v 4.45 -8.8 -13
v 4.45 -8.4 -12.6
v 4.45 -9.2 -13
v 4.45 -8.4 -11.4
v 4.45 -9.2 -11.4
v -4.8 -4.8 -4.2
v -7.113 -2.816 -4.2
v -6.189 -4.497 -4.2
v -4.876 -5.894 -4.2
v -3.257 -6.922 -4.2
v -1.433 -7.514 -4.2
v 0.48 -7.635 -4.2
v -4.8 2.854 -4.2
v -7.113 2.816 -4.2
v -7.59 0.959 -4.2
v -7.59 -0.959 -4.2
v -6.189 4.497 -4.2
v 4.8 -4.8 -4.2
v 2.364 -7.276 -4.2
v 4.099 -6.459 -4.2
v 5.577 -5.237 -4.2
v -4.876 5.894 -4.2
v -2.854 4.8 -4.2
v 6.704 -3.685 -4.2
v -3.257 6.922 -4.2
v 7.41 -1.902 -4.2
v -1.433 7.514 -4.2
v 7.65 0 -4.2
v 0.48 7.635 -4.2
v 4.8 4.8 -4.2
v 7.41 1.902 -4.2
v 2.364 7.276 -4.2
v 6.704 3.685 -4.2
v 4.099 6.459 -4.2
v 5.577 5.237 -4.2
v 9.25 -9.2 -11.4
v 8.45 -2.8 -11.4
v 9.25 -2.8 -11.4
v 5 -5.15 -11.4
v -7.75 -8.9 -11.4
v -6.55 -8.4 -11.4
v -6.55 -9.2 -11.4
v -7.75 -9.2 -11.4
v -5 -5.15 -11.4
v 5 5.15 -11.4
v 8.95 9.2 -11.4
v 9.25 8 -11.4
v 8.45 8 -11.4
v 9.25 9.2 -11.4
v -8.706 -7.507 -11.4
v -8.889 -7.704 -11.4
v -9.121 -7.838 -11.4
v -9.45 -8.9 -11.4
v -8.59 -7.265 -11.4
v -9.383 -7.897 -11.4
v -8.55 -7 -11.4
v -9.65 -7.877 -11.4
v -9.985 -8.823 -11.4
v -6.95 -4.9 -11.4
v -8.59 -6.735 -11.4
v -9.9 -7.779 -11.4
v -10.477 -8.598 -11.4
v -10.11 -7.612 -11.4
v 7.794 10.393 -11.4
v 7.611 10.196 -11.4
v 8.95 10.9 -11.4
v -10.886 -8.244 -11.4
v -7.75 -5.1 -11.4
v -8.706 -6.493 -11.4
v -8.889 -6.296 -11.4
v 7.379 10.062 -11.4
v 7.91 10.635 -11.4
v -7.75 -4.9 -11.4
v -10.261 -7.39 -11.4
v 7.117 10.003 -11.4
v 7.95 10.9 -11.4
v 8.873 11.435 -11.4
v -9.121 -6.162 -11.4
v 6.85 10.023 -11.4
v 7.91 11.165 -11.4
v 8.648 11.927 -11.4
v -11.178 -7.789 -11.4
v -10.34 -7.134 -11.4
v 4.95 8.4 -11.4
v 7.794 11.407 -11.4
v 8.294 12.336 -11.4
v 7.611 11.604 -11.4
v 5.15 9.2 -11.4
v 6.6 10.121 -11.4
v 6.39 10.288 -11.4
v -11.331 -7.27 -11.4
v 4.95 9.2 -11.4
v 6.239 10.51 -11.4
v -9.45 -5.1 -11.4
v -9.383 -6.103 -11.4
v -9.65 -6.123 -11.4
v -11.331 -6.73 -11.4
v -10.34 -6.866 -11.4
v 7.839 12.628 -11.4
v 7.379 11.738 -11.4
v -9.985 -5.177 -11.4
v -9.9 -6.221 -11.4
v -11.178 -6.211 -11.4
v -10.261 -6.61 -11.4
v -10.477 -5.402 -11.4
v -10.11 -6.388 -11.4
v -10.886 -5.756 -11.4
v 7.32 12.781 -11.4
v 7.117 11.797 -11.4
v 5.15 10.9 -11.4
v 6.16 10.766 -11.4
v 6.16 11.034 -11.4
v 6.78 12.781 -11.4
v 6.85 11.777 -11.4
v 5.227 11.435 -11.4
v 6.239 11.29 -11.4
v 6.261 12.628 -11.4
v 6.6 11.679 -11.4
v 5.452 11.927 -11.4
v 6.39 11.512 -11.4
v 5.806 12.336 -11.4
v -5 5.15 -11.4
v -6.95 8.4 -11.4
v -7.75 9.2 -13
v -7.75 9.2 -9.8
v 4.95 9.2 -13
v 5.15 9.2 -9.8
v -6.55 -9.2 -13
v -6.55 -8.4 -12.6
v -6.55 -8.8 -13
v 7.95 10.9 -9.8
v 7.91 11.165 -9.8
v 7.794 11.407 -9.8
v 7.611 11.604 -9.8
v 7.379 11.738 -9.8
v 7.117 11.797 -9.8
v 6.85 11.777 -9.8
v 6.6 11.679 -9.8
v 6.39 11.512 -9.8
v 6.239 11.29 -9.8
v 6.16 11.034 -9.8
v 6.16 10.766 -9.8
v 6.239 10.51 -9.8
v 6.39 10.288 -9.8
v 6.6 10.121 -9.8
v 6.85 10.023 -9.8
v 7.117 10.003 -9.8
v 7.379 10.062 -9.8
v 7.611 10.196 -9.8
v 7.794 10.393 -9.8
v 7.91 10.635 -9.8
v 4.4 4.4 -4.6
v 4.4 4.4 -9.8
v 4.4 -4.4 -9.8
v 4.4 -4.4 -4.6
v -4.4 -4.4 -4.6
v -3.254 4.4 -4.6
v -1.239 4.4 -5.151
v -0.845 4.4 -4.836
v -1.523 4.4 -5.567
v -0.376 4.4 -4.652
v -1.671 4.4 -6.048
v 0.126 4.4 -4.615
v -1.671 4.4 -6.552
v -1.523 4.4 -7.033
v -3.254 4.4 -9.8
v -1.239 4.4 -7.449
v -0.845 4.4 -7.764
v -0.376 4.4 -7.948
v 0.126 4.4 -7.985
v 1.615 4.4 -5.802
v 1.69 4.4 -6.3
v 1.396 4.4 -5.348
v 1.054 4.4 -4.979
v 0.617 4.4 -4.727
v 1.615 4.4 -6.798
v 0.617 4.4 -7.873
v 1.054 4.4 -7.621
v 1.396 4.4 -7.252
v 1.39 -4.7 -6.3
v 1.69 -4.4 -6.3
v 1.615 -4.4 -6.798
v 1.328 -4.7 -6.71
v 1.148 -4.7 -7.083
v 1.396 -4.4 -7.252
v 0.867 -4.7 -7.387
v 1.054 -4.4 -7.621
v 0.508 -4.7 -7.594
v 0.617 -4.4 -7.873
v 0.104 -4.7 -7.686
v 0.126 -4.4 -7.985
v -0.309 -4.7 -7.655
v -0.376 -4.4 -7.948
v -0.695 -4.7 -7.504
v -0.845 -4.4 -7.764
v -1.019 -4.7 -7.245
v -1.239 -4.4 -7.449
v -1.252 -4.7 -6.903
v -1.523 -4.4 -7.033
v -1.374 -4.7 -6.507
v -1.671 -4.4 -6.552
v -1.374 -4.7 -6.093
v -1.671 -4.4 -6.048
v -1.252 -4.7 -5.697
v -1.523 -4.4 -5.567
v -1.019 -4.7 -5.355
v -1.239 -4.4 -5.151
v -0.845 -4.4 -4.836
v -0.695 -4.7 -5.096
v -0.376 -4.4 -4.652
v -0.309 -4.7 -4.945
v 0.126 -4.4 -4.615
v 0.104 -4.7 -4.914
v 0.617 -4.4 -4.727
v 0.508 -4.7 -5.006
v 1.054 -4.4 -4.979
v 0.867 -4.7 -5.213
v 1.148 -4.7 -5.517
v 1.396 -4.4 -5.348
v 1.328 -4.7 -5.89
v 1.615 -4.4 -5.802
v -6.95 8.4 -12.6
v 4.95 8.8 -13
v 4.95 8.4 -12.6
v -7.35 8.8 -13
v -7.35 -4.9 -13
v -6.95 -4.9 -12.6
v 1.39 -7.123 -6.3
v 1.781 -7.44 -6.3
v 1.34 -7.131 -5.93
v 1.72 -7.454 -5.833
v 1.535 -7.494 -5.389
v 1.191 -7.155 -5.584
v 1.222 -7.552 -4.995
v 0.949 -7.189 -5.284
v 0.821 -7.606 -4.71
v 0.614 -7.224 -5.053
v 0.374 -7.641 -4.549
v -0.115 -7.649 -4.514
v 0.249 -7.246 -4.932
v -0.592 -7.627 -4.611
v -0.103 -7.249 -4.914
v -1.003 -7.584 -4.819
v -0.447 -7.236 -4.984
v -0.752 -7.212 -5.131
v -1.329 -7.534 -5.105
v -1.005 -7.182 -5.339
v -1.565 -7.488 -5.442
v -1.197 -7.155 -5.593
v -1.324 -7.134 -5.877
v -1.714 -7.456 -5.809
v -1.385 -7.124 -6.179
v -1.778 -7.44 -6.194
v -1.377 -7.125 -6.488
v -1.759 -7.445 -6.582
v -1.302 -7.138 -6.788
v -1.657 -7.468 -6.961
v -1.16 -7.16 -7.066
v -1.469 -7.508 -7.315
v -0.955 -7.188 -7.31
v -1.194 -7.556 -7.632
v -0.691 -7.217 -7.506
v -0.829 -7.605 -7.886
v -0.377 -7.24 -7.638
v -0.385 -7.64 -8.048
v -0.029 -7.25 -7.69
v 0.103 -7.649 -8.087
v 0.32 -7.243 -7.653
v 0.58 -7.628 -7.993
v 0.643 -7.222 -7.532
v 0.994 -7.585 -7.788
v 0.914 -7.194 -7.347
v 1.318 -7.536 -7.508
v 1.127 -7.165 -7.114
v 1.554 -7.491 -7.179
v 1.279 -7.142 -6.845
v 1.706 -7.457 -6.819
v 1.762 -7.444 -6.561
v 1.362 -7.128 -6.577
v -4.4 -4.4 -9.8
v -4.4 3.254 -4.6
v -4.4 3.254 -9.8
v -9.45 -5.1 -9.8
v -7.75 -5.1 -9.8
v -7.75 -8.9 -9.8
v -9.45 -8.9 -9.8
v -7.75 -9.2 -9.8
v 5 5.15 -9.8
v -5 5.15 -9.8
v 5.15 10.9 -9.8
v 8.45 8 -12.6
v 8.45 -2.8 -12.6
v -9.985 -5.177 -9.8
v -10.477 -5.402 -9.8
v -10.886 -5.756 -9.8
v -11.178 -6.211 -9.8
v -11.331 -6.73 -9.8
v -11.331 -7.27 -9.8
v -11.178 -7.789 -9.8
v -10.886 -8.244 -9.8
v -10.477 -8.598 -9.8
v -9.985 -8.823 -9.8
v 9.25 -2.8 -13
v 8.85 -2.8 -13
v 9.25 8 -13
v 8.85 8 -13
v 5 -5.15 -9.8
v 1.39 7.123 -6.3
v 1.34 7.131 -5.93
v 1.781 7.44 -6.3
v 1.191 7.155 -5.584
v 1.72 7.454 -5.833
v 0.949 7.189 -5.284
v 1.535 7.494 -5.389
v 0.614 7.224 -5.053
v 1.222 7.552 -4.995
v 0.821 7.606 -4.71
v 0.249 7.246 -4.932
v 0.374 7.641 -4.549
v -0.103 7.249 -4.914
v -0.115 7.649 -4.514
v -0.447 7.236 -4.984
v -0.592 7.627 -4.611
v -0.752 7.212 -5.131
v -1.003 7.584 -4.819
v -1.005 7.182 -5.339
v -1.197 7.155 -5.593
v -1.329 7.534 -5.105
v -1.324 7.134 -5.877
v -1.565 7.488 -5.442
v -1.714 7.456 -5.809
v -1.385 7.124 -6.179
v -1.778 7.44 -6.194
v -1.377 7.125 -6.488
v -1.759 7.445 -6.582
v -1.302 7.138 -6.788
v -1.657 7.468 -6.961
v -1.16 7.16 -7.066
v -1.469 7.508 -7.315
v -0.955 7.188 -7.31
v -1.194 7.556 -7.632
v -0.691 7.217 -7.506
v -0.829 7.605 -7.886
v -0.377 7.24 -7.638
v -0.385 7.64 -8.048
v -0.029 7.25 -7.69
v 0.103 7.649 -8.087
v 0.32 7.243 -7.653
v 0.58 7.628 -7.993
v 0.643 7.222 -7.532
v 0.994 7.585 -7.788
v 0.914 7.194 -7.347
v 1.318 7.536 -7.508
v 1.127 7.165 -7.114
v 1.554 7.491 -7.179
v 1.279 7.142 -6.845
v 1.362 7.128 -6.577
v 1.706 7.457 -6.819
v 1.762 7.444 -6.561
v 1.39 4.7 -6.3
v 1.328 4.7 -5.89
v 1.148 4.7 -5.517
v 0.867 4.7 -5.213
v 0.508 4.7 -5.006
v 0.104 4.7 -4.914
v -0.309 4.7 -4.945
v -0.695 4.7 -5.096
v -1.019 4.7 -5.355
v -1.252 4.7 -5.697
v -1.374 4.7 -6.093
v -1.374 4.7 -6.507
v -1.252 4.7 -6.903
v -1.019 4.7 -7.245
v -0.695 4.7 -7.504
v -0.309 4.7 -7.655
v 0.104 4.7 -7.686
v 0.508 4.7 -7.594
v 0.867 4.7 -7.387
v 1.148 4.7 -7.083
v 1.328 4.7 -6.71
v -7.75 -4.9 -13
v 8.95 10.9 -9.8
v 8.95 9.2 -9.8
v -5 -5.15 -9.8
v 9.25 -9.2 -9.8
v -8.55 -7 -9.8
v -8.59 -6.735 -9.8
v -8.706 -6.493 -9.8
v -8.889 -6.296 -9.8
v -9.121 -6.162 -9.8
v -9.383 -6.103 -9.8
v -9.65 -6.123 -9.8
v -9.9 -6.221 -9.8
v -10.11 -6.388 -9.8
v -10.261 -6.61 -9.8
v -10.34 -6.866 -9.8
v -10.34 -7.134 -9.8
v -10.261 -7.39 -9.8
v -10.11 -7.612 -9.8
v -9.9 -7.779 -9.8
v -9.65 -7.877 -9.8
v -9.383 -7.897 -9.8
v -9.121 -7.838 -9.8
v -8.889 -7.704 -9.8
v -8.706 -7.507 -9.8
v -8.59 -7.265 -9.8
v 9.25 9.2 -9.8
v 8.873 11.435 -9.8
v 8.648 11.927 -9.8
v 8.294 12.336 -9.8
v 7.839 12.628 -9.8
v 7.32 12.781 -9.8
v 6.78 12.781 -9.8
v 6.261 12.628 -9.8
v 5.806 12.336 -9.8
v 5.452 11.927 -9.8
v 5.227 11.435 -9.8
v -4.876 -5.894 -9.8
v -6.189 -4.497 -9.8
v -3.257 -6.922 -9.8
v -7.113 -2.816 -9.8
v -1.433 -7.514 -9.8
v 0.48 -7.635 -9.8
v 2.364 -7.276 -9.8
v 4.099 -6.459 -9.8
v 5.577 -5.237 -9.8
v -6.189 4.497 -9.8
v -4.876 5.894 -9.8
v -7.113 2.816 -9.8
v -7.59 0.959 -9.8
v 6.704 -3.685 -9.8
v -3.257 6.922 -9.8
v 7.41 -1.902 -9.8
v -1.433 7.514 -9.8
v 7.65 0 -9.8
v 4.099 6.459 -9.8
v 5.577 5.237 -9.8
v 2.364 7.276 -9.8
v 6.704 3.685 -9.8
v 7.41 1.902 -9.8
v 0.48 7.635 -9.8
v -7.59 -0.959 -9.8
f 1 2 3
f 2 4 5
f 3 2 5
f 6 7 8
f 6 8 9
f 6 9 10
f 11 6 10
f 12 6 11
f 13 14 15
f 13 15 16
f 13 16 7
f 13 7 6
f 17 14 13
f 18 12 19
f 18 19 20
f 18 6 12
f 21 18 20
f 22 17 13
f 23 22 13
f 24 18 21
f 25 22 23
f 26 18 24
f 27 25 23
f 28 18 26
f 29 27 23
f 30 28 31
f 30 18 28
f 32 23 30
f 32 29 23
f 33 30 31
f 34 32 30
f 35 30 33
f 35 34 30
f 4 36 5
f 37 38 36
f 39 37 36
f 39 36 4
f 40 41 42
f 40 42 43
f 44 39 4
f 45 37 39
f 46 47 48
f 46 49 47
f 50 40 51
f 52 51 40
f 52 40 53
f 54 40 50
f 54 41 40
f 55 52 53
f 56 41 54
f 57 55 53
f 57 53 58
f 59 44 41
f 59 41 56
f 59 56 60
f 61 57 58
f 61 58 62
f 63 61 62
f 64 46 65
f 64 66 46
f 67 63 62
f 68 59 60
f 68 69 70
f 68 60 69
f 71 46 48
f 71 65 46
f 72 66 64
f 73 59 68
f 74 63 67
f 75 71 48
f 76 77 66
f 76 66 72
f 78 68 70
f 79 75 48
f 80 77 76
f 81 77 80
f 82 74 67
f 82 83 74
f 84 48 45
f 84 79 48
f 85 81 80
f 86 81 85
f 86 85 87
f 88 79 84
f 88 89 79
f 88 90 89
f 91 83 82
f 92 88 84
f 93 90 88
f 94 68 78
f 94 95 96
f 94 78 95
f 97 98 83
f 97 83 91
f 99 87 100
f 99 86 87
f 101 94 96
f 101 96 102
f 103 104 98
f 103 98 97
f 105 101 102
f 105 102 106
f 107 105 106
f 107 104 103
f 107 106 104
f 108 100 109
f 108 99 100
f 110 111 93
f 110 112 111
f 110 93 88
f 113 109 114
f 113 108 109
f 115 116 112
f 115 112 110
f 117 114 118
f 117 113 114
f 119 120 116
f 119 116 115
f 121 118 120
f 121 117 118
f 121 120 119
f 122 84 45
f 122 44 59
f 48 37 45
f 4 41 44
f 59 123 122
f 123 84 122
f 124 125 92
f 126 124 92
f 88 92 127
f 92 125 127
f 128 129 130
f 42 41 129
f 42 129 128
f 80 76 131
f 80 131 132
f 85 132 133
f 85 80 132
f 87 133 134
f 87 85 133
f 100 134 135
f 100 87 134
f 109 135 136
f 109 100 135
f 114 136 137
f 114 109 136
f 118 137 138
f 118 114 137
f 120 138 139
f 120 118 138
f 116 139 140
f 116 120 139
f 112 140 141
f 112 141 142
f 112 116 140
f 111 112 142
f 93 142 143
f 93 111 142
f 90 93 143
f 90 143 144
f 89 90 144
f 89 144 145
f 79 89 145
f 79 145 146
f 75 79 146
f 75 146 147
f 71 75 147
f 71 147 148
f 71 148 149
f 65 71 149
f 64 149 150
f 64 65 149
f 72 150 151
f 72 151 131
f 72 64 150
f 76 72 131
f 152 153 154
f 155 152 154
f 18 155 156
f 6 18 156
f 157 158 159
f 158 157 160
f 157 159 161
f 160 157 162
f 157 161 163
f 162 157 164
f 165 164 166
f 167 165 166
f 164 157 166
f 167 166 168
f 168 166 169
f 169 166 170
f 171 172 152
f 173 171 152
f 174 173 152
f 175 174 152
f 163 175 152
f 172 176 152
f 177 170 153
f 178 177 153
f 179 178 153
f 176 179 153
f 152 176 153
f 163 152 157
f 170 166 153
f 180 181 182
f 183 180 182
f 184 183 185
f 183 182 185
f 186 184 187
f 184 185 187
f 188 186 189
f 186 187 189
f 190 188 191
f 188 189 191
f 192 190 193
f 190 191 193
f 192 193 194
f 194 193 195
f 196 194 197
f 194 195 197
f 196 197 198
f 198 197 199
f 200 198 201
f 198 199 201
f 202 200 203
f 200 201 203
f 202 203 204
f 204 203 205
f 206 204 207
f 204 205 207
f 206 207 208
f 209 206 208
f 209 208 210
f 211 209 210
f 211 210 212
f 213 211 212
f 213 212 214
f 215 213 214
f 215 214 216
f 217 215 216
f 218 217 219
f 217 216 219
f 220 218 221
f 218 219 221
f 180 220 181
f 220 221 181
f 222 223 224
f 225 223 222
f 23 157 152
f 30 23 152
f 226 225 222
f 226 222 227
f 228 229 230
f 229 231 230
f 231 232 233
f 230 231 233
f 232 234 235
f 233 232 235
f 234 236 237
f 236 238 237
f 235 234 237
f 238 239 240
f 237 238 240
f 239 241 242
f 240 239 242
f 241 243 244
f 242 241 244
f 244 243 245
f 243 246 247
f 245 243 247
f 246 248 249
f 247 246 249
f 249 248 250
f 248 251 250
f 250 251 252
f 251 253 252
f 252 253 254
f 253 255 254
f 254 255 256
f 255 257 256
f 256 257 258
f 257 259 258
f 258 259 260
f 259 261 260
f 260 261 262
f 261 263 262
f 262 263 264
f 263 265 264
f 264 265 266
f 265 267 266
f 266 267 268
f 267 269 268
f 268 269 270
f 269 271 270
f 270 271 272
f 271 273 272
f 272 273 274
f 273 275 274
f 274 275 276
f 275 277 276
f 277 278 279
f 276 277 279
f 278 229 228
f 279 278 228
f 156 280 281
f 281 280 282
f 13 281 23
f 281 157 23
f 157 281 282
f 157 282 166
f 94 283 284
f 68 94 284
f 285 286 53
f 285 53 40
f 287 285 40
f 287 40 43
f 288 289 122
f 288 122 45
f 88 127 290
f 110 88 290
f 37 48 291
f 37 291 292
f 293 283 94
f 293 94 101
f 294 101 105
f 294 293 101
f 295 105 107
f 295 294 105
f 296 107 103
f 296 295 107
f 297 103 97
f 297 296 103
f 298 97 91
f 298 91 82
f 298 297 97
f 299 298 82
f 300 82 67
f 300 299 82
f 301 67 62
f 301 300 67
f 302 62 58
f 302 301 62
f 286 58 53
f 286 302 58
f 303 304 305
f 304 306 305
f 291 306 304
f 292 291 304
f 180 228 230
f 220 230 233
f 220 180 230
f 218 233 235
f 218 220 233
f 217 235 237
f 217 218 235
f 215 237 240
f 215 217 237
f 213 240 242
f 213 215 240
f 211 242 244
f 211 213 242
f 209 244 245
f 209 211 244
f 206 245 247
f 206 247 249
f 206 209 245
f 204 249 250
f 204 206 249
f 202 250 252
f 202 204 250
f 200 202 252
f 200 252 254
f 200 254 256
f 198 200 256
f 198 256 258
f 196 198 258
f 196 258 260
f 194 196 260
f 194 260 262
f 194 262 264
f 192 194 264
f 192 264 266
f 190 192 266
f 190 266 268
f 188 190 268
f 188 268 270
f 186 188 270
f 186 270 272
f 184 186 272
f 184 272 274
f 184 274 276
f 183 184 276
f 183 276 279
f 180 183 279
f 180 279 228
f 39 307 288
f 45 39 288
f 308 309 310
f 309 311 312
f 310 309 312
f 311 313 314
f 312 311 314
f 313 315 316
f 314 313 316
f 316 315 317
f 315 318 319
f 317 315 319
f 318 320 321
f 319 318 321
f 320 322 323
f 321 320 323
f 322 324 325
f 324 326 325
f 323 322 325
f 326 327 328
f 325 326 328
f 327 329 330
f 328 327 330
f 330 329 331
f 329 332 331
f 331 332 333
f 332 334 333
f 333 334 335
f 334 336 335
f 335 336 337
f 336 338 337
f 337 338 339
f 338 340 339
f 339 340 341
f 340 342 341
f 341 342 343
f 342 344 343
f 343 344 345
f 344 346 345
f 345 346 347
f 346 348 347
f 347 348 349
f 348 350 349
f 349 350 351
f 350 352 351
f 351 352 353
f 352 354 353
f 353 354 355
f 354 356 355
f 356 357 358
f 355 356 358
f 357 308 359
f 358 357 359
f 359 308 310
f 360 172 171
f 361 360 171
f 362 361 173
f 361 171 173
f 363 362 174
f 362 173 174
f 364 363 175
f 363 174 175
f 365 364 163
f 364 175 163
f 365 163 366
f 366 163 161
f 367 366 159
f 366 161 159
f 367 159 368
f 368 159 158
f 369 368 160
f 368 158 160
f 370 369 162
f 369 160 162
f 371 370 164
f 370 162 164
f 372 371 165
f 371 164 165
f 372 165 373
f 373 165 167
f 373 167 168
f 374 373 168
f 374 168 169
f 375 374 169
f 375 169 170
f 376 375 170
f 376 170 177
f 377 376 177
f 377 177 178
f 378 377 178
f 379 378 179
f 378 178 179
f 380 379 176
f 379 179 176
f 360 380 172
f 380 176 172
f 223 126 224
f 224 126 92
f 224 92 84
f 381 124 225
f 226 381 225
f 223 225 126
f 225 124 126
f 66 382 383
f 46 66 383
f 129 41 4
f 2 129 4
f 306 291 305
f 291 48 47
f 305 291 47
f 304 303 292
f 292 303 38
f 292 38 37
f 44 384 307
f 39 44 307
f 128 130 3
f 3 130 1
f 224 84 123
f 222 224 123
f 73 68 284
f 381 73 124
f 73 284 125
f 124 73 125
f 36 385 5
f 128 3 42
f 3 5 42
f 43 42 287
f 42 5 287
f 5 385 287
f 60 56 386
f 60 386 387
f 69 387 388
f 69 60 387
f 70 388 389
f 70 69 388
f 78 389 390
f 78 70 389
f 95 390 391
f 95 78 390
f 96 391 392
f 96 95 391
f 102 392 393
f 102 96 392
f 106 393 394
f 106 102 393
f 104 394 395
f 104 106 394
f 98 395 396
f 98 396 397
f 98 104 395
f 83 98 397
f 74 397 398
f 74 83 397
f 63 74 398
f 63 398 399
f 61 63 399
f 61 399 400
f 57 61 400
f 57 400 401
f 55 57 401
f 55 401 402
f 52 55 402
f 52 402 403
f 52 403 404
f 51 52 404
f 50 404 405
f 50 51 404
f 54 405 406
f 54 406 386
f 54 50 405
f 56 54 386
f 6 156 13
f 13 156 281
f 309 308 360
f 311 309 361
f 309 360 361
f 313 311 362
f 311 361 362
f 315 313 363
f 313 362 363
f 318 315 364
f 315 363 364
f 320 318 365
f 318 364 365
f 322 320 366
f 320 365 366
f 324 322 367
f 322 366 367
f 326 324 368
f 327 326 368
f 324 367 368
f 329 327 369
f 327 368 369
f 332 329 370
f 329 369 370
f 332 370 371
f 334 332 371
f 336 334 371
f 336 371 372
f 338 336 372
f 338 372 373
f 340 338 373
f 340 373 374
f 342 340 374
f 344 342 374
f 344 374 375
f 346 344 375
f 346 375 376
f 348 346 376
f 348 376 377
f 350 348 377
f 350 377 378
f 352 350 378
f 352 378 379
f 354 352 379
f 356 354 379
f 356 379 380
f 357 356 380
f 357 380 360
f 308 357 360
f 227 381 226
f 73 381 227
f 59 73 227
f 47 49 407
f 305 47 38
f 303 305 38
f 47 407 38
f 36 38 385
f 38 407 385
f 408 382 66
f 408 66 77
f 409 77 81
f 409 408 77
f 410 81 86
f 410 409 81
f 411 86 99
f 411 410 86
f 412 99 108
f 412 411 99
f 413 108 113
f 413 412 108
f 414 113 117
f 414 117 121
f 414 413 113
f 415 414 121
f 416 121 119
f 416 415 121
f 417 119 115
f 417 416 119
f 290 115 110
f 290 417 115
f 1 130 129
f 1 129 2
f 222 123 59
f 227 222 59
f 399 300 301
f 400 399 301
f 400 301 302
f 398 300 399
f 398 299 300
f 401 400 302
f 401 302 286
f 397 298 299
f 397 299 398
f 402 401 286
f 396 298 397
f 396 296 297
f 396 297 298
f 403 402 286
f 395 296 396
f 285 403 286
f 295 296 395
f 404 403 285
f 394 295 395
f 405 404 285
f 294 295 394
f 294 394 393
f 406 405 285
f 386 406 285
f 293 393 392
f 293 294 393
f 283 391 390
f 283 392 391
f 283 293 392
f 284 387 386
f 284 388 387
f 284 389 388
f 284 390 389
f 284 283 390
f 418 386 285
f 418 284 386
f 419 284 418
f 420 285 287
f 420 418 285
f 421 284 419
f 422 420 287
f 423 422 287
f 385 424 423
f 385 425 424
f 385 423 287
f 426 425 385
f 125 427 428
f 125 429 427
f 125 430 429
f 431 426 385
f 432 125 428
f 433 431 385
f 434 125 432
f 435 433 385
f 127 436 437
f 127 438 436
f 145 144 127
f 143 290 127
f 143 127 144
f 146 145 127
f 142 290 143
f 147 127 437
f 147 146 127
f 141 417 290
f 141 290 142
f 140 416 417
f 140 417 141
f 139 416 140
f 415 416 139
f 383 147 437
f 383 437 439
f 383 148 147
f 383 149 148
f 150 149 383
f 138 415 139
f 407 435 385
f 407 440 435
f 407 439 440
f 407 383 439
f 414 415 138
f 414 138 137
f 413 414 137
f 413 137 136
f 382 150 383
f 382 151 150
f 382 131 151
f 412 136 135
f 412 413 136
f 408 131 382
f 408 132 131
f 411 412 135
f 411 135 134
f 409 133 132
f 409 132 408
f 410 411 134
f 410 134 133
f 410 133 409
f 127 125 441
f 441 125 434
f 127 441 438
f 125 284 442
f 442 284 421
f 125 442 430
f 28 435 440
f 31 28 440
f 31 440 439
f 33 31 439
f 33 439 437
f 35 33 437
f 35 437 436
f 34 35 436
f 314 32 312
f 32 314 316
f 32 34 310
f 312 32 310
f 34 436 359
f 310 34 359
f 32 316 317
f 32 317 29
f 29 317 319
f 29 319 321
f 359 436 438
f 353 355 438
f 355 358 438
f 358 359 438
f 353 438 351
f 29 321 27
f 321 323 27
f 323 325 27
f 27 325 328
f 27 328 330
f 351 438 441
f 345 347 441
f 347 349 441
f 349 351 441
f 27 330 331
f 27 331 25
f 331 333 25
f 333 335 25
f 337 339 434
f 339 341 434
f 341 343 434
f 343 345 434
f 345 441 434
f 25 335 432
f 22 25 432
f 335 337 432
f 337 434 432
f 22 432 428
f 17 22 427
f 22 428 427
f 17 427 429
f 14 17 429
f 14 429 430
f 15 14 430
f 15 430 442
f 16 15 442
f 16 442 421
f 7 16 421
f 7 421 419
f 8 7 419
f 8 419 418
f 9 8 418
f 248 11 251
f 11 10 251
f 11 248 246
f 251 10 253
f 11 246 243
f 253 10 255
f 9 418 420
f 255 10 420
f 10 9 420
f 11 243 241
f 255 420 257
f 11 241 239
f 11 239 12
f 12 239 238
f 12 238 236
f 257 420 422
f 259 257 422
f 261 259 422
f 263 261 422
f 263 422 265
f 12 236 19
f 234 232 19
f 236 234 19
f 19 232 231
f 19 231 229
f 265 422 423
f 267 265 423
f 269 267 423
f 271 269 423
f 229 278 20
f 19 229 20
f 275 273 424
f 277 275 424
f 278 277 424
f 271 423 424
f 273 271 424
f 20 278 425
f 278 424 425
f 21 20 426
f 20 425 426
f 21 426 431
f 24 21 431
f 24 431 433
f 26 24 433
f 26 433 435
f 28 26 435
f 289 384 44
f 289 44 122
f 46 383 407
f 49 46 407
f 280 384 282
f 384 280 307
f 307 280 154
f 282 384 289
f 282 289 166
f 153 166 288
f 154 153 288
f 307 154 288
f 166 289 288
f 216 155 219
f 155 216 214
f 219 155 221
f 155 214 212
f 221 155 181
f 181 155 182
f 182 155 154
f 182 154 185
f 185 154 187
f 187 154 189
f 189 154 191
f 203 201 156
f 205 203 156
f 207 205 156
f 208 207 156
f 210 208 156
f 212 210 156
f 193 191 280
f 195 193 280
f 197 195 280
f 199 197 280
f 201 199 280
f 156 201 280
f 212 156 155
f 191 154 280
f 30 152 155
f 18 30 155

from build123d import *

# Parameters (mm, degrees)
SKETCH004_R          = 0.9
PAD_DEPTH            = 1.6
SKETCH007_W          = 10
SKETCH007_H          = 10.3
POCKET001_DEPTH      = 1.601
POCKET001_DEPTH_BACK = 1.601
POCKET_DEPTH         = 1.6
CHAMFER001_SIZE      = 0.4
SKETCH008_R          = 7.65
PAD001_DEPTH         = 5.6
CHAMFER_SIZE         = 0.4
SKETCH029_R          = 1.39
POCKET016_DEPTH      = 12.801
POCKET016_DEPTH_BACK = 9.201
CHAMFER002_SIZE      = 0.4
CHAMFER003_SIZE      = 0.3
CHAMFER004_SIZE      = 0.3
CHAMFER005_SIZE      = 0.4


with BuildPart() as part:
    # Sketch004 → Pad (new body, symmetric)
    with BuildSketch(Plane.XY.offset(-11.4)):
        with BuildLine():
            ThreePointArc((8.95, 10.9), (7.05, 12.8), (5.15, 10.9))
            Line((5.15, 9.2), (5.15, 10.9))
            Line((-7.75, 9.2), (5.15, 9.2))
            Line((-7.75, -5.1), (-7.75, 9.2))
            Line((-9.45, -5.1), (-7.75, -5.1))
            ThreePointArc((-9.45, -5.1), (-11.35, -7), (-9.45, -8.9))
            Line((-9.45, -8.9), (-7.75, -8.9))
            Line((-7.75, -8.9), (-7.75, -9.2))
            Line((9.25, -9.2), (-7.75, -9.2))
            Line((9.25, 9.2), (9.25, -9.2))
            Line((8.95, 9.2), (9.25, 9.2))
            Line((8.95, 10.9), (8.95, 9.2))
        make_face()
        with Locations((-9.45, -7)):
            Circle(SKETCH004_R, mode=Mode.SUBTRACT)
        with Locations((7.05, 10.9)):
            Circle(SKETCH004_R, mode=Mode.SUBTRACT)
    extrude(amount=PAD_DEPTH, both=True)

    # Sketch007 → Pocket001 (cut, two sides)
    with BuildSketch(Plane.XY.offset(-11.4)) as pocket001_sk:
        Rectangle(SKETCH007_W, SKETCH007_H)
    extrude(amount=-POCKET001_DEPTH, mode=Mode.SUBTRACT)
    extrude(pocket001_sk.sketch, amount=POCKET001_DEPTH_BACK, mode=Mode.SUBTRACT)

    # Sketch006 → Pocket (cut)
    with BuildSketch(Plane.XY.offset(-11.4)):
        with BuildLine():
            Line((8.45, 8), (8.45, -2.8))
            Line((11.05, -2.8), (8.45, -2.8))
            Line((11.05, -11), (11.05, -2.8))
            Line((4.45, -11), (11.05, -11))
            Line((4.45, -8.4), (4.45, -11))
            Line((-6.55, -8.4), (4.45, -8.4))
            Line((-6.55, -8.4), (-6.55, -8.9))
            Line((-6.55, -8.9), (-6.55, -9.2))
            Line((-6.55, -9.2), (-7.75, -9.2))
            Line((-7.75, -9.2), (-7.75, -8.9))
            Line((-9.65, -8.9), (-7.75, -8.9))
            ThreePointArc((-9.65, -5.1), (-11.55, -7), (-9.65, -8.9))
            Line((-9.65, -5.1), (-7.75, -5.1))
            Line((-7.75, -4.9), (-7.75, -5.1))
            Line((-7.75, -4.9), (-6.95, -4.9))
            Line((-6.95, 8.4), (-6.95, -4.9))
            Line((4.95, 8.4), (-6.95, 8.4))
            Line((4.95, 9.2), (4.95, 8.4))
            Line((4.95, 9.2), (5.15, 9.2))
            Line((5.15, 9.2), (5.15, 11.1))
            ThreePointArc((8.95, 11.1), (7.05, 13), (5.15, 11.1))
            Line((8.95, 11.1), (8.95, 9.2))
            Line((8.95, 9.2), (9.25, 9.2))
            Line((9.25, 8), (9.25, 9.2))
            Line((8.95, 8), (9.25, 8))
            Line((8.95, 8), (8.45, 8))
        make_face()
    extrude(amount=-POCKET_DEPTH, mode=Mode.SUBTRACT)

    # Chamfer001
    chamfer001_edges = [part.edges().sort_by_distance(p)[0] for p in [
        (-6.95, 1.75, -13),
        (-1, 8.4, -13),
        (8.45, 2.6, -13),
        (-1.05, -8.4, -13),
    ]]
    chamfer(chamfer001_edges, length=CHAMFER001_SIZE)

    # Sketch008 (on Face5 of Pocket001) → Pad001 (join)
    with BuildSketch(Plane.XY.offset(-9.8)):
        Circle(SKETCH008_R)
        Polygon((-4.4, 3.254487), (-3.254487, 4.4), (4.4, 4.4), (4.4, -4.4), (-4.4, -4.4), align=None, mode=Mode.SUBTRACT)
    extrude(amount=PAD001_DEPTH)

    # Chamfer
    chamfer_edges = [part.edges().sort_by_distance(p)[0] for p in [
        (4.4, 0, -4.2),
        (0.572756, 4.4, -4.2),
        (0, -4.4, -4.2),
        (-4.4, -0.572756, -4.2),
    ]]
    chamfer(chamfer_edges, length=CHAMFER_SIZE)

    # Sketch029 → Pocket016 (cut, two sides)
    with BuildSketch(Plane.XZ) as pocket016_sk:
        with Locations((0, -6.3)):
            Circle(SKETCH029_R)
    extrude(amount=-POCKET016_DEPTH, mode=Mode.SUBTRACT)
    extrude(pocket016_sk.sketch, amount=POCKET016_DEPTH_BACK, mode=Mode.SUBTRACT)

    # Chamfer002
    chamfer002_edges = [part.edges().sort_by_distance(p)[0] for p in [
        (-1.39, -7.522659, -6.3),
    ]]
    chamfer(chamfer002_edges, length=CHAMFER002_SIZE)

    # Chamfer003
    chamfer003_edges = [part.edges().sort_by_distance(p)[0] for p in [
        (-1.39, -4.4, -6.3),
    ]]
    chamfer(chamfer003_edges, length=CHAMFER003_SIZE)

    # Chamfer004
    chamfer004_edges = [part.edges().sort_by_distance(p)[0] for p in [
        (-1.39, 4.4, -6.3),
    ]]
    chamfer(chamfer004_edges, length=CHAMFER004_SIZE)

    # Chamfer005
    chamfer005_edges = [part.edges().sort_by_distance(p)[0] for p in [
        (-1.39, 7.522659, -6.3),
    ]]
    chamfer(chamfer005_edges, length=CHAMFER005_SIZE)


solid = part.part
